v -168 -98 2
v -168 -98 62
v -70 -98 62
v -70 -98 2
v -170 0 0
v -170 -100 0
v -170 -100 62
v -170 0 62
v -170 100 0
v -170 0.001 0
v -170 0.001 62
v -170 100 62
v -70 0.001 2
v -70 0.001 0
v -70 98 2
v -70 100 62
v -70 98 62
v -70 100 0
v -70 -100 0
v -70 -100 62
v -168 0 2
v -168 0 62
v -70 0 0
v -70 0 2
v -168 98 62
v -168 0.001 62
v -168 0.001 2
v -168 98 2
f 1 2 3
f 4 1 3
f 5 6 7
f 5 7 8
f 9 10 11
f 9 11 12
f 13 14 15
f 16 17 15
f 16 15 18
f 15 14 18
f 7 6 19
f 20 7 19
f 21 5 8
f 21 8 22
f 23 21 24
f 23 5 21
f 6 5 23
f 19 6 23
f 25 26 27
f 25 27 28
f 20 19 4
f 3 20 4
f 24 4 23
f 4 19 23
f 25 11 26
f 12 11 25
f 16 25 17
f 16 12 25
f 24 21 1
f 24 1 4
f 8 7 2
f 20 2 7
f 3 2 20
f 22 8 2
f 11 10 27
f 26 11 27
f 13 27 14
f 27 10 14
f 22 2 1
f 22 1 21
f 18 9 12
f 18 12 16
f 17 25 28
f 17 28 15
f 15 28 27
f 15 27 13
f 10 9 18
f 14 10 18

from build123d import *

# Parameters (mm, degrees)
F0_W     = 100
F0_H     = 200
F1_DEPTH = 62
F2_W     = 98
F2_H     = 196
F3_DEPTH = 60
F4_W     = 100
F4_H     = 0.001
F5_DEPTH = 62.001


with BuildPart() as f1:
    # F0 (on Top) → F1 (new body)
    with BuildSketch(Plane.XY):
        with Locations((-120, 0)):
            Rectangle(F0_W, F0_H)
    extrude(amount=F1_DEPTH)

    # F2 (on face) → F3 (cut)
    with BuildSketch(Plane.XY.offset(62)):
        with Locations((-119, 0)):
            Rectangle(F2_W, F2_H)
    extrude(amount=-F3_DEPTH, mode=Mode.SUBTRACT)

    # F4 (on face) → F5 (cut, through all)
    with BuildSketch(Plane(origin=(0, 0, 0), x_dir=(1, 0, 0), z_dir=(0, 0, -1))):
        with Locations((-120, -0.0005)):
            Rectangle(F4_W, F4_H)
    extrude(amount=-F5_DEPTH, mode=Mode.SUBTRACT)


solid = f1.part
